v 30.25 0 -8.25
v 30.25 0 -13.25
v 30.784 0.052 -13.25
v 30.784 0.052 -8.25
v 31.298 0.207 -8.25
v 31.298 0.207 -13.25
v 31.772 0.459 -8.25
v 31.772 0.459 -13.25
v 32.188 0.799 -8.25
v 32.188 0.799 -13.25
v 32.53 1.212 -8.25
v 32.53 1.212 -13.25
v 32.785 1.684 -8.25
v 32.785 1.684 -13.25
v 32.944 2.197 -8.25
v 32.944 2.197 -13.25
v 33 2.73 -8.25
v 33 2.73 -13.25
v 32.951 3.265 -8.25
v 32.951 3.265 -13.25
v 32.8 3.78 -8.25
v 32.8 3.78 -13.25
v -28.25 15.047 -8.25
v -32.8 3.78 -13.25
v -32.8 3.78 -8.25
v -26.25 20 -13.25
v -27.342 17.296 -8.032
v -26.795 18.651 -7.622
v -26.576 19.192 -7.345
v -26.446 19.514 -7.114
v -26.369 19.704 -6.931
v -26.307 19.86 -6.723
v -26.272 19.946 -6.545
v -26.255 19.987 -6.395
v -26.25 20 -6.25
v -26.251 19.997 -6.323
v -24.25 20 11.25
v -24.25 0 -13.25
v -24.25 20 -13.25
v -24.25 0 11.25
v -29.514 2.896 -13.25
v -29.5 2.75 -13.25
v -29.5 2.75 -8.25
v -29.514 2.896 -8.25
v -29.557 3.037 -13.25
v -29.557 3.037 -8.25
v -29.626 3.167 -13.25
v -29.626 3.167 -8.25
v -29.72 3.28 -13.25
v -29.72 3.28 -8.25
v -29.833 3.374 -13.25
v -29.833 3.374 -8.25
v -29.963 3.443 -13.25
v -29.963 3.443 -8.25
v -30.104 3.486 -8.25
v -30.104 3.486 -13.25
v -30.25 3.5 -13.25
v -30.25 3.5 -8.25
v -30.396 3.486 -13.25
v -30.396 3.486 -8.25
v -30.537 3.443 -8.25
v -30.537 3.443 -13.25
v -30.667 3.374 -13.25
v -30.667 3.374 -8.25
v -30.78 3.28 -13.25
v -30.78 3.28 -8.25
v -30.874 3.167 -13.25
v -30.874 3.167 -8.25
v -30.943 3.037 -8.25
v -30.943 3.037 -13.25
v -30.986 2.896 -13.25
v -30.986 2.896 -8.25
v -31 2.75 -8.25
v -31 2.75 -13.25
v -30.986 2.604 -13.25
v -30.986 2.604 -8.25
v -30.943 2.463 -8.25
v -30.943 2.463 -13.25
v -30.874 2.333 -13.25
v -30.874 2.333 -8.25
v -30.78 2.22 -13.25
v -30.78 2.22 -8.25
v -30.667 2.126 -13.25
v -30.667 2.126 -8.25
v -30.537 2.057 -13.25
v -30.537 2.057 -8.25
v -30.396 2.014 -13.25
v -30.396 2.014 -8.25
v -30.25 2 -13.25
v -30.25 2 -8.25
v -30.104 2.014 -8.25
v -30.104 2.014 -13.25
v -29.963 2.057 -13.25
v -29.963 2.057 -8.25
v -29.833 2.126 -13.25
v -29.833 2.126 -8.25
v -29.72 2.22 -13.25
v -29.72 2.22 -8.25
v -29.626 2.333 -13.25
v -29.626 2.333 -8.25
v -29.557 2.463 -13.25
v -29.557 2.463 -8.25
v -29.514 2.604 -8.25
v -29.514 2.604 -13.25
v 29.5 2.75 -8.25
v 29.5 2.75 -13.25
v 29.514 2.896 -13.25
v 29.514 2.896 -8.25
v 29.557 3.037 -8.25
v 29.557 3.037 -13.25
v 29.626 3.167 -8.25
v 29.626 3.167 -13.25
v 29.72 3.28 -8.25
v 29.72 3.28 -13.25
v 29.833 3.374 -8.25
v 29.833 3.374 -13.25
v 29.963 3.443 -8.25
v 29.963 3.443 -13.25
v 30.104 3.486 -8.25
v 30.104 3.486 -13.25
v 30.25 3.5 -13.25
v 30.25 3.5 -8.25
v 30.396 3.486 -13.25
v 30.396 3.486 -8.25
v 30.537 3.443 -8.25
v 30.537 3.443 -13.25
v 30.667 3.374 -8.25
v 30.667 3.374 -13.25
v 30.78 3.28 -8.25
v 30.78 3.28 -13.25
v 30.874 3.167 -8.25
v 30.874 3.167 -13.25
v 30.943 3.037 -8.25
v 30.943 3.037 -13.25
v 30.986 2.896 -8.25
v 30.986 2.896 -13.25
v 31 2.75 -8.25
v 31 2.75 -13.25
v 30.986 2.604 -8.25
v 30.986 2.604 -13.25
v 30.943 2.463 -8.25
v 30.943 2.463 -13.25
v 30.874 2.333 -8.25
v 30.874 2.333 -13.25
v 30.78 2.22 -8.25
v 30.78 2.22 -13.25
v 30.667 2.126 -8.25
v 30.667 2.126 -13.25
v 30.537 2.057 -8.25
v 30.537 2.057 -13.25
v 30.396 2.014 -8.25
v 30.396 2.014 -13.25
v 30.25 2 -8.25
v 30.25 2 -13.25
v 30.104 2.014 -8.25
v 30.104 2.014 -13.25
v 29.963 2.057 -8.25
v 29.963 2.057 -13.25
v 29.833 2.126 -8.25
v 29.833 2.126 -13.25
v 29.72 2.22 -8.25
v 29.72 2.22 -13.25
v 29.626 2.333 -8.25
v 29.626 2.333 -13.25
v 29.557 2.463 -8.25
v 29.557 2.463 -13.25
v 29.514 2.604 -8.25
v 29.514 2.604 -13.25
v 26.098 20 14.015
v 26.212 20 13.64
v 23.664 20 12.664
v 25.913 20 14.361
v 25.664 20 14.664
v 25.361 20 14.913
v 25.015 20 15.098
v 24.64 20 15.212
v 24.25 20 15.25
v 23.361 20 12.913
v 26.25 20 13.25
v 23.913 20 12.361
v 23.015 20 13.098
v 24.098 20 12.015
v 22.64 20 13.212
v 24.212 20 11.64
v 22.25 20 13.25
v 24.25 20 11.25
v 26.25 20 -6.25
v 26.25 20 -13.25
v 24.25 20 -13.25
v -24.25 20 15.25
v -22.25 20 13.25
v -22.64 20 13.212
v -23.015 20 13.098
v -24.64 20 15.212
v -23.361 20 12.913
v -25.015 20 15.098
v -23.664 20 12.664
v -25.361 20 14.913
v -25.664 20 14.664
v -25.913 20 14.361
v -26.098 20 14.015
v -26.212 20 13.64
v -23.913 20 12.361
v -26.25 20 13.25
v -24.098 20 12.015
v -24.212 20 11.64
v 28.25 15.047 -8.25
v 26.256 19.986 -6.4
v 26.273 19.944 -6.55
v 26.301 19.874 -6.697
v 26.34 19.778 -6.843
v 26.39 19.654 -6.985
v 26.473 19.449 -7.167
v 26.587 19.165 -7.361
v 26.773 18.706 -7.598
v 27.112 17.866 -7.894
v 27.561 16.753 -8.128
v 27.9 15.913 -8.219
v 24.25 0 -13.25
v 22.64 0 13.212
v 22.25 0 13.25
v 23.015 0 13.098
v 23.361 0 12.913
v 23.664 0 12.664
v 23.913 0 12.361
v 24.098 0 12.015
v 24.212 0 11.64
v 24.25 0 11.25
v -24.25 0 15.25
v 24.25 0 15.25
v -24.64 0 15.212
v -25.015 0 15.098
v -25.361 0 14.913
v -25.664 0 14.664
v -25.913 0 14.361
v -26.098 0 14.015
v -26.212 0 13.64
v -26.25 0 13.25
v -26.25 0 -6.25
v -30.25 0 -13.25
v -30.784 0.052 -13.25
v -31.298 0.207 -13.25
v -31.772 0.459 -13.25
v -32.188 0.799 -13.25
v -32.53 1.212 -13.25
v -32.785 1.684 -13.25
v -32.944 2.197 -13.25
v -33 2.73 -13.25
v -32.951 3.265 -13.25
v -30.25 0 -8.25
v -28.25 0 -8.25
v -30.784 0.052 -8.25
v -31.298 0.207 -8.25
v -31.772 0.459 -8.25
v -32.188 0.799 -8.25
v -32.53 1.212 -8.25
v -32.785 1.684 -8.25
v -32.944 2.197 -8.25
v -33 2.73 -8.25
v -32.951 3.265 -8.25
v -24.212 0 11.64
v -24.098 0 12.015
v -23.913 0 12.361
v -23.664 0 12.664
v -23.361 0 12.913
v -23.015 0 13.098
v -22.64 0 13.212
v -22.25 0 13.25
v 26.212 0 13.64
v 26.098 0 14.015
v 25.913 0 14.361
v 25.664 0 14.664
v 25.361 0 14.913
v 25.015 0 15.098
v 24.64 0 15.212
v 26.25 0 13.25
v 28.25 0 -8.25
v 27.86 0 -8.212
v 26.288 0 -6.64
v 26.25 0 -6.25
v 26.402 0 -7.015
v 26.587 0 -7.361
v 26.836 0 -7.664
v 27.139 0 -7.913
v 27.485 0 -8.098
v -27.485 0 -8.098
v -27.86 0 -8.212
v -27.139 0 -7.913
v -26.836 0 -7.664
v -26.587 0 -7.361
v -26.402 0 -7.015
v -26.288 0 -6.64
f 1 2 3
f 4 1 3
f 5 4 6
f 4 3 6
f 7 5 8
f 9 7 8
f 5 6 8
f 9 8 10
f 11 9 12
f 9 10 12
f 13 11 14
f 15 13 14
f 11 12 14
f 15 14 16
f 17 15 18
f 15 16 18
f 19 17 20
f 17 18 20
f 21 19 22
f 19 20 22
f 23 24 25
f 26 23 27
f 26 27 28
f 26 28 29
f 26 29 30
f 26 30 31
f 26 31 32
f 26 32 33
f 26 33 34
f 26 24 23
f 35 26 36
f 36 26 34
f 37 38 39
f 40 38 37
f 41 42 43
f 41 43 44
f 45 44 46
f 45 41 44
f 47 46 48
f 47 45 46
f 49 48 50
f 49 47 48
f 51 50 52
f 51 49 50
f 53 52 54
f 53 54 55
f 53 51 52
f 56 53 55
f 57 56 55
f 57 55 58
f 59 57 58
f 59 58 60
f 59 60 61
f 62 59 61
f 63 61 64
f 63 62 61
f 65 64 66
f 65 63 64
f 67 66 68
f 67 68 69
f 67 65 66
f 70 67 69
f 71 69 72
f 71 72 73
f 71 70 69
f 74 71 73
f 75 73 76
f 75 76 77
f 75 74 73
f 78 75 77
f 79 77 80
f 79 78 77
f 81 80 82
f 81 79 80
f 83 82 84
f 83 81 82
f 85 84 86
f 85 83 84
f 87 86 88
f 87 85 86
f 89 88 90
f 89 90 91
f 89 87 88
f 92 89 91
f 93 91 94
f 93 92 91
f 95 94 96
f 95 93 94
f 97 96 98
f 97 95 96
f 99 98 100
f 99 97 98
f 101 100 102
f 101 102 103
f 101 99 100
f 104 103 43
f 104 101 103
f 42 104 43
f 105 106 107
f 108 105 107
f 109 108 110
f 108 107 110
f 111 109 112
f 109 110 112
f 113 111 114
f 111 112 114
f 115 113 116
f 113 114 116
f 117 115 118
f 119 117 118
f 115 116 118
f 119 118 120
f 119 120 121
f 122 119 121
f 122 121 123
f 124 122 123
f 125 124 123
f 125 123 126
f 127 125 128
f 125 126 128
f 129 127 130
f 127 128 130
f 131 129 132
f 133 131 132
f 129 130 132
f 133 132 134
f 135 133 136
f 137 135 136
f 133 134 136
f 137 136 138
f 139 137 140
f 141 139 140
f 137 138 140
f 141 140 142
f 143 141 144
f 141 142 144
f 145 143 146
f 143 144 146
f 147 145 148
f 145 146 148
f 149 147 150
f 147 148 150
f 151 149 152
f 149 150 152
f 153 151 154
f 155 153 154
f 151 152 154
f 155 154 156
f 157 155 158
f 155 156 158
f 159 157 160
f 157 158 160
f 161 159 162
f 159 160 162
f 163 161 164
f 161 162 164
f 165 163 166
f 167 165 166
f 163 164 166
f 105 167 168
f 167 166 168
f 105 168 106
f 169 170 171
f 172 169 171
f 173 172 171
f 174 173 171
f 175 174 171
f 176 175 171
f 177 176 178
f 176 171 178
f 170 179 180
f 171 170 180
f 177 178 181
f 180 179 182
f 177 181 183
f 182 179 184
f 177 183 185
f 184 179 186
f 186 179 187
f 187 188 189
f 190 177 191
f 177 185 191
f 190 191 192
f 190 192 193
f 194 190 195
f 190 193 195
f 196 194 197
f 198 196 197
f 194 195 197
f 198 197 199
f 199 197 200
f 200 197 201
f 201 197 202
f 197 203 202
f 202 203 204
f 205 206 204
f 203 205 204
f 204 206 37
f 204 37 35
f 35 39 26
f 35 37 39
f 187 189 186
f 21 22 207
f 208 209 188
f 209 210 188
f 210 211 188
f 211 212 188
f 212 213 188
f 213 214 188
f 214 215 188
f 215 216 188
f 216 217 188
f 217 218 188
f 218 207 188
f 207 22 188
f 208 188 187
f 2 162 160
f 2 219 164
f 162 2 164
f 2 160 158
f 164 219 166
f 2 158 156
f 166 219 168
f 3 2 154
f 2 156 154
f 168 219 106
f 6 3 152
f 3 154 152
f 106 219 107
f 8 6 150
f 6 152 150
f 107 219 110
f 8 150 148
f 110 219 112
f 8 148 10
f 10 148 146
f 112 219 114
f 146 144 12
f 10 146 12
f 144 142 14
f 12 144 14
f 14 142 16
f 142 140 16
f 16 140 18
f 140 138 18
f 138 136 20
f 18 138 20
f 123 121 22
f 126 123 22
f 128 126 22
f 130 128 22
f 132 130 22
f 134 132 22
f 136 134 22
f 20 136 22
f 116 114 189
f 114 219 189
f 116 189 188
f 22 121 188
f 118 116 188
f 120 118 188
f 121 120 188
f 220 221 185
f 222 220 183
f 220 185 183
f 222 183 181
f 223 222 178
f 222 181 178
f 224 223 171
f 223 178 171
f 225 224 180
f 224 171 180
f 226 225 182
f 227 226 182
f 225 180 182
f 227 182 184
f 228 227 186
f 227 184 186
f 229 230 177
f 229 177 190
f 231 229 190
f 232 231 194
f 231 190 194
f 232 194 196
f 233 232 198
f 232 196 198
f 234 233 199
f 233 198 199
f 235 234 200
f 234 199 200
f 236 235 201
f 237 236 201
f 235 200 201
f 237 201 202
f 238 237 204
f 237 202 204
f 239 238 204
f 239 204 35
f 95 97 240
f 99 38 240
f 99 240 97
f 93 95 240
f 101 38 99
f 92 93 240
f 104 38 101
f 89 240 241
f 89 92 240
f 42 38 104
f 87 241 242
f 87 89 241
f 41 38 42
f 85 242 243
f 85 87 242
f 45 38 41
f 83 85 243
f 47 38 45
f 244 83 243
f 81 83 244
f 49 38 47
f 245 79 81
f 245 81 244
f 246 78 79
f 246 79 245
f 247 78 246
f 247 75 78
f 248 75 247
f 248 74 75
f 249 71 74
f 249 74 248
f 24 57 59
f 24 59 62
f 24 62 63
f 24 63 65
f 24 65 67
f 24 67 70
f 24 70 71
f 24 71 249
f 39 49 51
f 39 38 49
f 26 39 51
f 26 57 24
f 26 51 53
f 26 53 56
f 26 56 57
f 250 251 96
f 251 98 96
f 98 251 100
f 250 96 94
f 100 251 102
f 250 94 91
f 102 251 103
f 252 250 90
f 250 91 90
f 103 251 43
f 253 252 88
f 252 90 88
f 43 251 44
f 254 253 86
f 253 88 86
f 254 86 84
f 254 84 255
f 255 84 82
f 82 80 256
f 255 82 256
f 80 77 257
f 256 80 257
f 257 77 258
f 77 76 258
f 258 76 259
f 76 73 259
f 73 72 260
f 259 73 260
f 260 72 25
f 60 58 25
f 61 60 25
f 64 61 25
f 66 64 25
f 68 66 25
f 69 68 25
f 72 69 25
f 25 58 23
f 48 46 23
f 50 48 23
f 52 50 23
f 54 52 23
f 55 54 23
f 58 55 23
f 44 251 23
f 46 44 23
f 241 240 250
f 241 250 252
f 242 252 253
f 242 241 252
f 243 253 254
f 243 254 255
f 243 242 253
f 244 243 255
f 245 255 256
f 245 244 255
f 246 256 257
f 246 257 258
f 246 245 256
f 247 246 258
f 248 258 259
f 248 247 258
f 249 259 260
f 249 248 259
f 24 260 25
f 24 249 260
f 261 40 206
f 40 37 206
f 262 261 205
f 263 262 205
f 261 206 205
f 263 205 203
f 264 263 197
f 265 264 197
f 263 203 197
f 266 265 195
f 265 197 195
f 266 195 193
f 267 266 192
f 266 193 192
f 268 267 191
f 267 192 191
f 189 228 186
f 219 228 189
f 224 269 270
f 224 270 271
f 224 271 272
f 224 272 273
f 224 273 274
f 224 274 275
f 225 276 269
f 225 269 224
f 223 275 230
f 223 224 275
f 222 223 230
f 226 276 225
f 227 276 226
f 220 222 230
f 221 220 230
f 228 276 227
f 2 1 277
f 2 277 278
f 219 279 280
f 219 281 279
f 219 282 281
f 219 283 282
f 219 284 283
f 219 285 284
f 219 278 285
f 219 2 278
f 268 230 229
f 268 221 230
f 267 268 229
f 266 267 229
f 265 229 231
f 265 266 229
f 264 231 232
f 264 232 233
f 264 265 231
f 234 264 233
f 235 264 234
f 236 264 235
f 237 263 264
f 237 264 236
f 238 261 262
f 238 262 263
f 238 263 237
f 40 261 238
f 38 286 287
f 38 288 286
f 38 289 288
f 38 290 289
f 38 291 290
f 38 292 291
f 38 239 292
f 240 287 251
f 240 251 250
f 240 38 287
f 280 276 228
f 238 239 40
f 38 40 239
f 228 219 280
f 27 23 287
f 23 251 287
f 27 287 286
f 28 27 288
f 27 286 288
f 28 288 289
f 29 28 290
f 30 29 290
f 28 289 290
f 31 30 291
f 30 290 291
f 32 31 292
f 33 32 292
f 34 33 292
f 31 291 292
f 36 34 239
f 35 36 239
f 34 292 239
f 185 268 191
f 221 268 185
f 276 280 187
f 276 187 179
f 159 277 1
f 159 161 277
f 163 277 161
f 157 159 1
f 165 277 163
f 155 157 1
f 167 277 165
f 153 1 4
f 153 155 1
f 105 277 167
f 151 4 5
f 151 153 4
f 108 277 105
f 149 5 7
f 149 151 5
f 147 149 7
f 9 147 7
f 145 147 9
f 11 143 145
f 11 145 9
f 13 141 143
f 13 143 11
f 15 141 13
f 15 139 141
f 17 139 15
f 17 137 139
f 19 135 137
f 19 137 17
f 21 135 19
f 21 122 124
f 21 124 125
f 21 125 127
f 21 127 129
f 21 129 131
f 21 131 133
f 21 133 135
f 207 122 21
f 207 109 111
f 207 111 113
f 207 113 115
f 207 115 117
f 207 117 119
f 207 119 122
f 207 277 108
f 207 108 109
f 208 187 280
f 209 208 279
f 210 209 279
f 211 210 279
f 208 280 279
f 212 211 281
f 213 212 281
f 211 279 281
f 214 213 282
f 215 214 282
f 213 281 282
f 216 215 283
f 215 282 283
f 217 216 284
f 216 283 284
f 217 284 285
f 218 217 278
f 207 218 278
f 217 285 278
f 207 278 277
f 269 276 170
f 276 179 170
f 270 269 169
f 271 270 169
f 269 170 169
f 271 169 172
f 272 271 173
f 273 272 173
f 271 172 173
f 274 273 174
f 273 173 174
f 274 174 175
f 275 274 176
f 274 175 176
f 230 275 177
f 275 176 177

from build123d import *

# Parameters (mm, degrees)
BOSS_EXTRUDE1_DEPTH = 20
FILLET1_R           = 2
SKETCH2_R           = 0.75
BOSS_EXTRUDE2_DEPTH = 5
FILLET2_R           = 2


with BuildPart() as part:
    # Sketch1 → Boss-Extrude1 (new body)
    with BuildSketch(Plane(origin=(0, 0, 0), x_dir=(1, 0, 0), z_dir=(0, 1, 0))):
        Polygon((26.25, 13.25), (26.25, -15.25), (-26.25, -15.25), (-26.25, 13.25), (-24.25, 13.25), (-24.25, -13.25), (24.25, -13.25), (24.25, 13.25), align=None)
    extrude(amount=BOSS_EXTRUDE1_DEPTH)

    # Fillet1
    fillet1_edges = [part.edges().sort_by_distance(p)[0] for p in [
        (-24.25, 10, 13.25),
        (24.25, 10, 13.25),
        (26.25, 10, 15.25),
        (-26.25, 10, 15.25),
    ]]
    fillet(fillet1_edges, radius=FILLET1_R)

    # Sketch2 → Boss-Extrude2 (add)
    with BuildSketch(Plane(origin=(0, 0, -13.25), x_dir=(-1, 0, 0), z_dir=(0, 0, -1))):
        with BuildLine():
            Line((-26.25, 0), (-30.25, 0))
            ThreePointArc((-30.25, 0), (-32.529711414, 1.212009145), (-32.799945678, 3.779697548))
            Line((-32.799945678, 3.779697548), (-26.25, 20))
            Line((-26.25, 20), (-26.25, 0))
        make_face()
        with Locations((-30.25, 2.75)):
            Circle(SKETCH2_R, mode=Mode.SUBTRACT)
    boss_extrude2 = extrude(amount=-BOSS_EXTRUDE2_DEPTH)

    # Mirror1: Boss-Extrude2 across plane
    add(boss_extrude2.mirror(Plane(origin=(0, 0, 0), x_dir=(0, 0, 1), z_dir=(1, 0, 0))))

    # Fillet2
    fillet2_edges = [part.edges().sort_by_distance(p)[0] for p in [
        (26.25, 10, -8.25),
        (-26.25, 10, -8.25),
    ]]
    fillet(fillet2_edges, radius=FILLET2_R)


solid = part.part
